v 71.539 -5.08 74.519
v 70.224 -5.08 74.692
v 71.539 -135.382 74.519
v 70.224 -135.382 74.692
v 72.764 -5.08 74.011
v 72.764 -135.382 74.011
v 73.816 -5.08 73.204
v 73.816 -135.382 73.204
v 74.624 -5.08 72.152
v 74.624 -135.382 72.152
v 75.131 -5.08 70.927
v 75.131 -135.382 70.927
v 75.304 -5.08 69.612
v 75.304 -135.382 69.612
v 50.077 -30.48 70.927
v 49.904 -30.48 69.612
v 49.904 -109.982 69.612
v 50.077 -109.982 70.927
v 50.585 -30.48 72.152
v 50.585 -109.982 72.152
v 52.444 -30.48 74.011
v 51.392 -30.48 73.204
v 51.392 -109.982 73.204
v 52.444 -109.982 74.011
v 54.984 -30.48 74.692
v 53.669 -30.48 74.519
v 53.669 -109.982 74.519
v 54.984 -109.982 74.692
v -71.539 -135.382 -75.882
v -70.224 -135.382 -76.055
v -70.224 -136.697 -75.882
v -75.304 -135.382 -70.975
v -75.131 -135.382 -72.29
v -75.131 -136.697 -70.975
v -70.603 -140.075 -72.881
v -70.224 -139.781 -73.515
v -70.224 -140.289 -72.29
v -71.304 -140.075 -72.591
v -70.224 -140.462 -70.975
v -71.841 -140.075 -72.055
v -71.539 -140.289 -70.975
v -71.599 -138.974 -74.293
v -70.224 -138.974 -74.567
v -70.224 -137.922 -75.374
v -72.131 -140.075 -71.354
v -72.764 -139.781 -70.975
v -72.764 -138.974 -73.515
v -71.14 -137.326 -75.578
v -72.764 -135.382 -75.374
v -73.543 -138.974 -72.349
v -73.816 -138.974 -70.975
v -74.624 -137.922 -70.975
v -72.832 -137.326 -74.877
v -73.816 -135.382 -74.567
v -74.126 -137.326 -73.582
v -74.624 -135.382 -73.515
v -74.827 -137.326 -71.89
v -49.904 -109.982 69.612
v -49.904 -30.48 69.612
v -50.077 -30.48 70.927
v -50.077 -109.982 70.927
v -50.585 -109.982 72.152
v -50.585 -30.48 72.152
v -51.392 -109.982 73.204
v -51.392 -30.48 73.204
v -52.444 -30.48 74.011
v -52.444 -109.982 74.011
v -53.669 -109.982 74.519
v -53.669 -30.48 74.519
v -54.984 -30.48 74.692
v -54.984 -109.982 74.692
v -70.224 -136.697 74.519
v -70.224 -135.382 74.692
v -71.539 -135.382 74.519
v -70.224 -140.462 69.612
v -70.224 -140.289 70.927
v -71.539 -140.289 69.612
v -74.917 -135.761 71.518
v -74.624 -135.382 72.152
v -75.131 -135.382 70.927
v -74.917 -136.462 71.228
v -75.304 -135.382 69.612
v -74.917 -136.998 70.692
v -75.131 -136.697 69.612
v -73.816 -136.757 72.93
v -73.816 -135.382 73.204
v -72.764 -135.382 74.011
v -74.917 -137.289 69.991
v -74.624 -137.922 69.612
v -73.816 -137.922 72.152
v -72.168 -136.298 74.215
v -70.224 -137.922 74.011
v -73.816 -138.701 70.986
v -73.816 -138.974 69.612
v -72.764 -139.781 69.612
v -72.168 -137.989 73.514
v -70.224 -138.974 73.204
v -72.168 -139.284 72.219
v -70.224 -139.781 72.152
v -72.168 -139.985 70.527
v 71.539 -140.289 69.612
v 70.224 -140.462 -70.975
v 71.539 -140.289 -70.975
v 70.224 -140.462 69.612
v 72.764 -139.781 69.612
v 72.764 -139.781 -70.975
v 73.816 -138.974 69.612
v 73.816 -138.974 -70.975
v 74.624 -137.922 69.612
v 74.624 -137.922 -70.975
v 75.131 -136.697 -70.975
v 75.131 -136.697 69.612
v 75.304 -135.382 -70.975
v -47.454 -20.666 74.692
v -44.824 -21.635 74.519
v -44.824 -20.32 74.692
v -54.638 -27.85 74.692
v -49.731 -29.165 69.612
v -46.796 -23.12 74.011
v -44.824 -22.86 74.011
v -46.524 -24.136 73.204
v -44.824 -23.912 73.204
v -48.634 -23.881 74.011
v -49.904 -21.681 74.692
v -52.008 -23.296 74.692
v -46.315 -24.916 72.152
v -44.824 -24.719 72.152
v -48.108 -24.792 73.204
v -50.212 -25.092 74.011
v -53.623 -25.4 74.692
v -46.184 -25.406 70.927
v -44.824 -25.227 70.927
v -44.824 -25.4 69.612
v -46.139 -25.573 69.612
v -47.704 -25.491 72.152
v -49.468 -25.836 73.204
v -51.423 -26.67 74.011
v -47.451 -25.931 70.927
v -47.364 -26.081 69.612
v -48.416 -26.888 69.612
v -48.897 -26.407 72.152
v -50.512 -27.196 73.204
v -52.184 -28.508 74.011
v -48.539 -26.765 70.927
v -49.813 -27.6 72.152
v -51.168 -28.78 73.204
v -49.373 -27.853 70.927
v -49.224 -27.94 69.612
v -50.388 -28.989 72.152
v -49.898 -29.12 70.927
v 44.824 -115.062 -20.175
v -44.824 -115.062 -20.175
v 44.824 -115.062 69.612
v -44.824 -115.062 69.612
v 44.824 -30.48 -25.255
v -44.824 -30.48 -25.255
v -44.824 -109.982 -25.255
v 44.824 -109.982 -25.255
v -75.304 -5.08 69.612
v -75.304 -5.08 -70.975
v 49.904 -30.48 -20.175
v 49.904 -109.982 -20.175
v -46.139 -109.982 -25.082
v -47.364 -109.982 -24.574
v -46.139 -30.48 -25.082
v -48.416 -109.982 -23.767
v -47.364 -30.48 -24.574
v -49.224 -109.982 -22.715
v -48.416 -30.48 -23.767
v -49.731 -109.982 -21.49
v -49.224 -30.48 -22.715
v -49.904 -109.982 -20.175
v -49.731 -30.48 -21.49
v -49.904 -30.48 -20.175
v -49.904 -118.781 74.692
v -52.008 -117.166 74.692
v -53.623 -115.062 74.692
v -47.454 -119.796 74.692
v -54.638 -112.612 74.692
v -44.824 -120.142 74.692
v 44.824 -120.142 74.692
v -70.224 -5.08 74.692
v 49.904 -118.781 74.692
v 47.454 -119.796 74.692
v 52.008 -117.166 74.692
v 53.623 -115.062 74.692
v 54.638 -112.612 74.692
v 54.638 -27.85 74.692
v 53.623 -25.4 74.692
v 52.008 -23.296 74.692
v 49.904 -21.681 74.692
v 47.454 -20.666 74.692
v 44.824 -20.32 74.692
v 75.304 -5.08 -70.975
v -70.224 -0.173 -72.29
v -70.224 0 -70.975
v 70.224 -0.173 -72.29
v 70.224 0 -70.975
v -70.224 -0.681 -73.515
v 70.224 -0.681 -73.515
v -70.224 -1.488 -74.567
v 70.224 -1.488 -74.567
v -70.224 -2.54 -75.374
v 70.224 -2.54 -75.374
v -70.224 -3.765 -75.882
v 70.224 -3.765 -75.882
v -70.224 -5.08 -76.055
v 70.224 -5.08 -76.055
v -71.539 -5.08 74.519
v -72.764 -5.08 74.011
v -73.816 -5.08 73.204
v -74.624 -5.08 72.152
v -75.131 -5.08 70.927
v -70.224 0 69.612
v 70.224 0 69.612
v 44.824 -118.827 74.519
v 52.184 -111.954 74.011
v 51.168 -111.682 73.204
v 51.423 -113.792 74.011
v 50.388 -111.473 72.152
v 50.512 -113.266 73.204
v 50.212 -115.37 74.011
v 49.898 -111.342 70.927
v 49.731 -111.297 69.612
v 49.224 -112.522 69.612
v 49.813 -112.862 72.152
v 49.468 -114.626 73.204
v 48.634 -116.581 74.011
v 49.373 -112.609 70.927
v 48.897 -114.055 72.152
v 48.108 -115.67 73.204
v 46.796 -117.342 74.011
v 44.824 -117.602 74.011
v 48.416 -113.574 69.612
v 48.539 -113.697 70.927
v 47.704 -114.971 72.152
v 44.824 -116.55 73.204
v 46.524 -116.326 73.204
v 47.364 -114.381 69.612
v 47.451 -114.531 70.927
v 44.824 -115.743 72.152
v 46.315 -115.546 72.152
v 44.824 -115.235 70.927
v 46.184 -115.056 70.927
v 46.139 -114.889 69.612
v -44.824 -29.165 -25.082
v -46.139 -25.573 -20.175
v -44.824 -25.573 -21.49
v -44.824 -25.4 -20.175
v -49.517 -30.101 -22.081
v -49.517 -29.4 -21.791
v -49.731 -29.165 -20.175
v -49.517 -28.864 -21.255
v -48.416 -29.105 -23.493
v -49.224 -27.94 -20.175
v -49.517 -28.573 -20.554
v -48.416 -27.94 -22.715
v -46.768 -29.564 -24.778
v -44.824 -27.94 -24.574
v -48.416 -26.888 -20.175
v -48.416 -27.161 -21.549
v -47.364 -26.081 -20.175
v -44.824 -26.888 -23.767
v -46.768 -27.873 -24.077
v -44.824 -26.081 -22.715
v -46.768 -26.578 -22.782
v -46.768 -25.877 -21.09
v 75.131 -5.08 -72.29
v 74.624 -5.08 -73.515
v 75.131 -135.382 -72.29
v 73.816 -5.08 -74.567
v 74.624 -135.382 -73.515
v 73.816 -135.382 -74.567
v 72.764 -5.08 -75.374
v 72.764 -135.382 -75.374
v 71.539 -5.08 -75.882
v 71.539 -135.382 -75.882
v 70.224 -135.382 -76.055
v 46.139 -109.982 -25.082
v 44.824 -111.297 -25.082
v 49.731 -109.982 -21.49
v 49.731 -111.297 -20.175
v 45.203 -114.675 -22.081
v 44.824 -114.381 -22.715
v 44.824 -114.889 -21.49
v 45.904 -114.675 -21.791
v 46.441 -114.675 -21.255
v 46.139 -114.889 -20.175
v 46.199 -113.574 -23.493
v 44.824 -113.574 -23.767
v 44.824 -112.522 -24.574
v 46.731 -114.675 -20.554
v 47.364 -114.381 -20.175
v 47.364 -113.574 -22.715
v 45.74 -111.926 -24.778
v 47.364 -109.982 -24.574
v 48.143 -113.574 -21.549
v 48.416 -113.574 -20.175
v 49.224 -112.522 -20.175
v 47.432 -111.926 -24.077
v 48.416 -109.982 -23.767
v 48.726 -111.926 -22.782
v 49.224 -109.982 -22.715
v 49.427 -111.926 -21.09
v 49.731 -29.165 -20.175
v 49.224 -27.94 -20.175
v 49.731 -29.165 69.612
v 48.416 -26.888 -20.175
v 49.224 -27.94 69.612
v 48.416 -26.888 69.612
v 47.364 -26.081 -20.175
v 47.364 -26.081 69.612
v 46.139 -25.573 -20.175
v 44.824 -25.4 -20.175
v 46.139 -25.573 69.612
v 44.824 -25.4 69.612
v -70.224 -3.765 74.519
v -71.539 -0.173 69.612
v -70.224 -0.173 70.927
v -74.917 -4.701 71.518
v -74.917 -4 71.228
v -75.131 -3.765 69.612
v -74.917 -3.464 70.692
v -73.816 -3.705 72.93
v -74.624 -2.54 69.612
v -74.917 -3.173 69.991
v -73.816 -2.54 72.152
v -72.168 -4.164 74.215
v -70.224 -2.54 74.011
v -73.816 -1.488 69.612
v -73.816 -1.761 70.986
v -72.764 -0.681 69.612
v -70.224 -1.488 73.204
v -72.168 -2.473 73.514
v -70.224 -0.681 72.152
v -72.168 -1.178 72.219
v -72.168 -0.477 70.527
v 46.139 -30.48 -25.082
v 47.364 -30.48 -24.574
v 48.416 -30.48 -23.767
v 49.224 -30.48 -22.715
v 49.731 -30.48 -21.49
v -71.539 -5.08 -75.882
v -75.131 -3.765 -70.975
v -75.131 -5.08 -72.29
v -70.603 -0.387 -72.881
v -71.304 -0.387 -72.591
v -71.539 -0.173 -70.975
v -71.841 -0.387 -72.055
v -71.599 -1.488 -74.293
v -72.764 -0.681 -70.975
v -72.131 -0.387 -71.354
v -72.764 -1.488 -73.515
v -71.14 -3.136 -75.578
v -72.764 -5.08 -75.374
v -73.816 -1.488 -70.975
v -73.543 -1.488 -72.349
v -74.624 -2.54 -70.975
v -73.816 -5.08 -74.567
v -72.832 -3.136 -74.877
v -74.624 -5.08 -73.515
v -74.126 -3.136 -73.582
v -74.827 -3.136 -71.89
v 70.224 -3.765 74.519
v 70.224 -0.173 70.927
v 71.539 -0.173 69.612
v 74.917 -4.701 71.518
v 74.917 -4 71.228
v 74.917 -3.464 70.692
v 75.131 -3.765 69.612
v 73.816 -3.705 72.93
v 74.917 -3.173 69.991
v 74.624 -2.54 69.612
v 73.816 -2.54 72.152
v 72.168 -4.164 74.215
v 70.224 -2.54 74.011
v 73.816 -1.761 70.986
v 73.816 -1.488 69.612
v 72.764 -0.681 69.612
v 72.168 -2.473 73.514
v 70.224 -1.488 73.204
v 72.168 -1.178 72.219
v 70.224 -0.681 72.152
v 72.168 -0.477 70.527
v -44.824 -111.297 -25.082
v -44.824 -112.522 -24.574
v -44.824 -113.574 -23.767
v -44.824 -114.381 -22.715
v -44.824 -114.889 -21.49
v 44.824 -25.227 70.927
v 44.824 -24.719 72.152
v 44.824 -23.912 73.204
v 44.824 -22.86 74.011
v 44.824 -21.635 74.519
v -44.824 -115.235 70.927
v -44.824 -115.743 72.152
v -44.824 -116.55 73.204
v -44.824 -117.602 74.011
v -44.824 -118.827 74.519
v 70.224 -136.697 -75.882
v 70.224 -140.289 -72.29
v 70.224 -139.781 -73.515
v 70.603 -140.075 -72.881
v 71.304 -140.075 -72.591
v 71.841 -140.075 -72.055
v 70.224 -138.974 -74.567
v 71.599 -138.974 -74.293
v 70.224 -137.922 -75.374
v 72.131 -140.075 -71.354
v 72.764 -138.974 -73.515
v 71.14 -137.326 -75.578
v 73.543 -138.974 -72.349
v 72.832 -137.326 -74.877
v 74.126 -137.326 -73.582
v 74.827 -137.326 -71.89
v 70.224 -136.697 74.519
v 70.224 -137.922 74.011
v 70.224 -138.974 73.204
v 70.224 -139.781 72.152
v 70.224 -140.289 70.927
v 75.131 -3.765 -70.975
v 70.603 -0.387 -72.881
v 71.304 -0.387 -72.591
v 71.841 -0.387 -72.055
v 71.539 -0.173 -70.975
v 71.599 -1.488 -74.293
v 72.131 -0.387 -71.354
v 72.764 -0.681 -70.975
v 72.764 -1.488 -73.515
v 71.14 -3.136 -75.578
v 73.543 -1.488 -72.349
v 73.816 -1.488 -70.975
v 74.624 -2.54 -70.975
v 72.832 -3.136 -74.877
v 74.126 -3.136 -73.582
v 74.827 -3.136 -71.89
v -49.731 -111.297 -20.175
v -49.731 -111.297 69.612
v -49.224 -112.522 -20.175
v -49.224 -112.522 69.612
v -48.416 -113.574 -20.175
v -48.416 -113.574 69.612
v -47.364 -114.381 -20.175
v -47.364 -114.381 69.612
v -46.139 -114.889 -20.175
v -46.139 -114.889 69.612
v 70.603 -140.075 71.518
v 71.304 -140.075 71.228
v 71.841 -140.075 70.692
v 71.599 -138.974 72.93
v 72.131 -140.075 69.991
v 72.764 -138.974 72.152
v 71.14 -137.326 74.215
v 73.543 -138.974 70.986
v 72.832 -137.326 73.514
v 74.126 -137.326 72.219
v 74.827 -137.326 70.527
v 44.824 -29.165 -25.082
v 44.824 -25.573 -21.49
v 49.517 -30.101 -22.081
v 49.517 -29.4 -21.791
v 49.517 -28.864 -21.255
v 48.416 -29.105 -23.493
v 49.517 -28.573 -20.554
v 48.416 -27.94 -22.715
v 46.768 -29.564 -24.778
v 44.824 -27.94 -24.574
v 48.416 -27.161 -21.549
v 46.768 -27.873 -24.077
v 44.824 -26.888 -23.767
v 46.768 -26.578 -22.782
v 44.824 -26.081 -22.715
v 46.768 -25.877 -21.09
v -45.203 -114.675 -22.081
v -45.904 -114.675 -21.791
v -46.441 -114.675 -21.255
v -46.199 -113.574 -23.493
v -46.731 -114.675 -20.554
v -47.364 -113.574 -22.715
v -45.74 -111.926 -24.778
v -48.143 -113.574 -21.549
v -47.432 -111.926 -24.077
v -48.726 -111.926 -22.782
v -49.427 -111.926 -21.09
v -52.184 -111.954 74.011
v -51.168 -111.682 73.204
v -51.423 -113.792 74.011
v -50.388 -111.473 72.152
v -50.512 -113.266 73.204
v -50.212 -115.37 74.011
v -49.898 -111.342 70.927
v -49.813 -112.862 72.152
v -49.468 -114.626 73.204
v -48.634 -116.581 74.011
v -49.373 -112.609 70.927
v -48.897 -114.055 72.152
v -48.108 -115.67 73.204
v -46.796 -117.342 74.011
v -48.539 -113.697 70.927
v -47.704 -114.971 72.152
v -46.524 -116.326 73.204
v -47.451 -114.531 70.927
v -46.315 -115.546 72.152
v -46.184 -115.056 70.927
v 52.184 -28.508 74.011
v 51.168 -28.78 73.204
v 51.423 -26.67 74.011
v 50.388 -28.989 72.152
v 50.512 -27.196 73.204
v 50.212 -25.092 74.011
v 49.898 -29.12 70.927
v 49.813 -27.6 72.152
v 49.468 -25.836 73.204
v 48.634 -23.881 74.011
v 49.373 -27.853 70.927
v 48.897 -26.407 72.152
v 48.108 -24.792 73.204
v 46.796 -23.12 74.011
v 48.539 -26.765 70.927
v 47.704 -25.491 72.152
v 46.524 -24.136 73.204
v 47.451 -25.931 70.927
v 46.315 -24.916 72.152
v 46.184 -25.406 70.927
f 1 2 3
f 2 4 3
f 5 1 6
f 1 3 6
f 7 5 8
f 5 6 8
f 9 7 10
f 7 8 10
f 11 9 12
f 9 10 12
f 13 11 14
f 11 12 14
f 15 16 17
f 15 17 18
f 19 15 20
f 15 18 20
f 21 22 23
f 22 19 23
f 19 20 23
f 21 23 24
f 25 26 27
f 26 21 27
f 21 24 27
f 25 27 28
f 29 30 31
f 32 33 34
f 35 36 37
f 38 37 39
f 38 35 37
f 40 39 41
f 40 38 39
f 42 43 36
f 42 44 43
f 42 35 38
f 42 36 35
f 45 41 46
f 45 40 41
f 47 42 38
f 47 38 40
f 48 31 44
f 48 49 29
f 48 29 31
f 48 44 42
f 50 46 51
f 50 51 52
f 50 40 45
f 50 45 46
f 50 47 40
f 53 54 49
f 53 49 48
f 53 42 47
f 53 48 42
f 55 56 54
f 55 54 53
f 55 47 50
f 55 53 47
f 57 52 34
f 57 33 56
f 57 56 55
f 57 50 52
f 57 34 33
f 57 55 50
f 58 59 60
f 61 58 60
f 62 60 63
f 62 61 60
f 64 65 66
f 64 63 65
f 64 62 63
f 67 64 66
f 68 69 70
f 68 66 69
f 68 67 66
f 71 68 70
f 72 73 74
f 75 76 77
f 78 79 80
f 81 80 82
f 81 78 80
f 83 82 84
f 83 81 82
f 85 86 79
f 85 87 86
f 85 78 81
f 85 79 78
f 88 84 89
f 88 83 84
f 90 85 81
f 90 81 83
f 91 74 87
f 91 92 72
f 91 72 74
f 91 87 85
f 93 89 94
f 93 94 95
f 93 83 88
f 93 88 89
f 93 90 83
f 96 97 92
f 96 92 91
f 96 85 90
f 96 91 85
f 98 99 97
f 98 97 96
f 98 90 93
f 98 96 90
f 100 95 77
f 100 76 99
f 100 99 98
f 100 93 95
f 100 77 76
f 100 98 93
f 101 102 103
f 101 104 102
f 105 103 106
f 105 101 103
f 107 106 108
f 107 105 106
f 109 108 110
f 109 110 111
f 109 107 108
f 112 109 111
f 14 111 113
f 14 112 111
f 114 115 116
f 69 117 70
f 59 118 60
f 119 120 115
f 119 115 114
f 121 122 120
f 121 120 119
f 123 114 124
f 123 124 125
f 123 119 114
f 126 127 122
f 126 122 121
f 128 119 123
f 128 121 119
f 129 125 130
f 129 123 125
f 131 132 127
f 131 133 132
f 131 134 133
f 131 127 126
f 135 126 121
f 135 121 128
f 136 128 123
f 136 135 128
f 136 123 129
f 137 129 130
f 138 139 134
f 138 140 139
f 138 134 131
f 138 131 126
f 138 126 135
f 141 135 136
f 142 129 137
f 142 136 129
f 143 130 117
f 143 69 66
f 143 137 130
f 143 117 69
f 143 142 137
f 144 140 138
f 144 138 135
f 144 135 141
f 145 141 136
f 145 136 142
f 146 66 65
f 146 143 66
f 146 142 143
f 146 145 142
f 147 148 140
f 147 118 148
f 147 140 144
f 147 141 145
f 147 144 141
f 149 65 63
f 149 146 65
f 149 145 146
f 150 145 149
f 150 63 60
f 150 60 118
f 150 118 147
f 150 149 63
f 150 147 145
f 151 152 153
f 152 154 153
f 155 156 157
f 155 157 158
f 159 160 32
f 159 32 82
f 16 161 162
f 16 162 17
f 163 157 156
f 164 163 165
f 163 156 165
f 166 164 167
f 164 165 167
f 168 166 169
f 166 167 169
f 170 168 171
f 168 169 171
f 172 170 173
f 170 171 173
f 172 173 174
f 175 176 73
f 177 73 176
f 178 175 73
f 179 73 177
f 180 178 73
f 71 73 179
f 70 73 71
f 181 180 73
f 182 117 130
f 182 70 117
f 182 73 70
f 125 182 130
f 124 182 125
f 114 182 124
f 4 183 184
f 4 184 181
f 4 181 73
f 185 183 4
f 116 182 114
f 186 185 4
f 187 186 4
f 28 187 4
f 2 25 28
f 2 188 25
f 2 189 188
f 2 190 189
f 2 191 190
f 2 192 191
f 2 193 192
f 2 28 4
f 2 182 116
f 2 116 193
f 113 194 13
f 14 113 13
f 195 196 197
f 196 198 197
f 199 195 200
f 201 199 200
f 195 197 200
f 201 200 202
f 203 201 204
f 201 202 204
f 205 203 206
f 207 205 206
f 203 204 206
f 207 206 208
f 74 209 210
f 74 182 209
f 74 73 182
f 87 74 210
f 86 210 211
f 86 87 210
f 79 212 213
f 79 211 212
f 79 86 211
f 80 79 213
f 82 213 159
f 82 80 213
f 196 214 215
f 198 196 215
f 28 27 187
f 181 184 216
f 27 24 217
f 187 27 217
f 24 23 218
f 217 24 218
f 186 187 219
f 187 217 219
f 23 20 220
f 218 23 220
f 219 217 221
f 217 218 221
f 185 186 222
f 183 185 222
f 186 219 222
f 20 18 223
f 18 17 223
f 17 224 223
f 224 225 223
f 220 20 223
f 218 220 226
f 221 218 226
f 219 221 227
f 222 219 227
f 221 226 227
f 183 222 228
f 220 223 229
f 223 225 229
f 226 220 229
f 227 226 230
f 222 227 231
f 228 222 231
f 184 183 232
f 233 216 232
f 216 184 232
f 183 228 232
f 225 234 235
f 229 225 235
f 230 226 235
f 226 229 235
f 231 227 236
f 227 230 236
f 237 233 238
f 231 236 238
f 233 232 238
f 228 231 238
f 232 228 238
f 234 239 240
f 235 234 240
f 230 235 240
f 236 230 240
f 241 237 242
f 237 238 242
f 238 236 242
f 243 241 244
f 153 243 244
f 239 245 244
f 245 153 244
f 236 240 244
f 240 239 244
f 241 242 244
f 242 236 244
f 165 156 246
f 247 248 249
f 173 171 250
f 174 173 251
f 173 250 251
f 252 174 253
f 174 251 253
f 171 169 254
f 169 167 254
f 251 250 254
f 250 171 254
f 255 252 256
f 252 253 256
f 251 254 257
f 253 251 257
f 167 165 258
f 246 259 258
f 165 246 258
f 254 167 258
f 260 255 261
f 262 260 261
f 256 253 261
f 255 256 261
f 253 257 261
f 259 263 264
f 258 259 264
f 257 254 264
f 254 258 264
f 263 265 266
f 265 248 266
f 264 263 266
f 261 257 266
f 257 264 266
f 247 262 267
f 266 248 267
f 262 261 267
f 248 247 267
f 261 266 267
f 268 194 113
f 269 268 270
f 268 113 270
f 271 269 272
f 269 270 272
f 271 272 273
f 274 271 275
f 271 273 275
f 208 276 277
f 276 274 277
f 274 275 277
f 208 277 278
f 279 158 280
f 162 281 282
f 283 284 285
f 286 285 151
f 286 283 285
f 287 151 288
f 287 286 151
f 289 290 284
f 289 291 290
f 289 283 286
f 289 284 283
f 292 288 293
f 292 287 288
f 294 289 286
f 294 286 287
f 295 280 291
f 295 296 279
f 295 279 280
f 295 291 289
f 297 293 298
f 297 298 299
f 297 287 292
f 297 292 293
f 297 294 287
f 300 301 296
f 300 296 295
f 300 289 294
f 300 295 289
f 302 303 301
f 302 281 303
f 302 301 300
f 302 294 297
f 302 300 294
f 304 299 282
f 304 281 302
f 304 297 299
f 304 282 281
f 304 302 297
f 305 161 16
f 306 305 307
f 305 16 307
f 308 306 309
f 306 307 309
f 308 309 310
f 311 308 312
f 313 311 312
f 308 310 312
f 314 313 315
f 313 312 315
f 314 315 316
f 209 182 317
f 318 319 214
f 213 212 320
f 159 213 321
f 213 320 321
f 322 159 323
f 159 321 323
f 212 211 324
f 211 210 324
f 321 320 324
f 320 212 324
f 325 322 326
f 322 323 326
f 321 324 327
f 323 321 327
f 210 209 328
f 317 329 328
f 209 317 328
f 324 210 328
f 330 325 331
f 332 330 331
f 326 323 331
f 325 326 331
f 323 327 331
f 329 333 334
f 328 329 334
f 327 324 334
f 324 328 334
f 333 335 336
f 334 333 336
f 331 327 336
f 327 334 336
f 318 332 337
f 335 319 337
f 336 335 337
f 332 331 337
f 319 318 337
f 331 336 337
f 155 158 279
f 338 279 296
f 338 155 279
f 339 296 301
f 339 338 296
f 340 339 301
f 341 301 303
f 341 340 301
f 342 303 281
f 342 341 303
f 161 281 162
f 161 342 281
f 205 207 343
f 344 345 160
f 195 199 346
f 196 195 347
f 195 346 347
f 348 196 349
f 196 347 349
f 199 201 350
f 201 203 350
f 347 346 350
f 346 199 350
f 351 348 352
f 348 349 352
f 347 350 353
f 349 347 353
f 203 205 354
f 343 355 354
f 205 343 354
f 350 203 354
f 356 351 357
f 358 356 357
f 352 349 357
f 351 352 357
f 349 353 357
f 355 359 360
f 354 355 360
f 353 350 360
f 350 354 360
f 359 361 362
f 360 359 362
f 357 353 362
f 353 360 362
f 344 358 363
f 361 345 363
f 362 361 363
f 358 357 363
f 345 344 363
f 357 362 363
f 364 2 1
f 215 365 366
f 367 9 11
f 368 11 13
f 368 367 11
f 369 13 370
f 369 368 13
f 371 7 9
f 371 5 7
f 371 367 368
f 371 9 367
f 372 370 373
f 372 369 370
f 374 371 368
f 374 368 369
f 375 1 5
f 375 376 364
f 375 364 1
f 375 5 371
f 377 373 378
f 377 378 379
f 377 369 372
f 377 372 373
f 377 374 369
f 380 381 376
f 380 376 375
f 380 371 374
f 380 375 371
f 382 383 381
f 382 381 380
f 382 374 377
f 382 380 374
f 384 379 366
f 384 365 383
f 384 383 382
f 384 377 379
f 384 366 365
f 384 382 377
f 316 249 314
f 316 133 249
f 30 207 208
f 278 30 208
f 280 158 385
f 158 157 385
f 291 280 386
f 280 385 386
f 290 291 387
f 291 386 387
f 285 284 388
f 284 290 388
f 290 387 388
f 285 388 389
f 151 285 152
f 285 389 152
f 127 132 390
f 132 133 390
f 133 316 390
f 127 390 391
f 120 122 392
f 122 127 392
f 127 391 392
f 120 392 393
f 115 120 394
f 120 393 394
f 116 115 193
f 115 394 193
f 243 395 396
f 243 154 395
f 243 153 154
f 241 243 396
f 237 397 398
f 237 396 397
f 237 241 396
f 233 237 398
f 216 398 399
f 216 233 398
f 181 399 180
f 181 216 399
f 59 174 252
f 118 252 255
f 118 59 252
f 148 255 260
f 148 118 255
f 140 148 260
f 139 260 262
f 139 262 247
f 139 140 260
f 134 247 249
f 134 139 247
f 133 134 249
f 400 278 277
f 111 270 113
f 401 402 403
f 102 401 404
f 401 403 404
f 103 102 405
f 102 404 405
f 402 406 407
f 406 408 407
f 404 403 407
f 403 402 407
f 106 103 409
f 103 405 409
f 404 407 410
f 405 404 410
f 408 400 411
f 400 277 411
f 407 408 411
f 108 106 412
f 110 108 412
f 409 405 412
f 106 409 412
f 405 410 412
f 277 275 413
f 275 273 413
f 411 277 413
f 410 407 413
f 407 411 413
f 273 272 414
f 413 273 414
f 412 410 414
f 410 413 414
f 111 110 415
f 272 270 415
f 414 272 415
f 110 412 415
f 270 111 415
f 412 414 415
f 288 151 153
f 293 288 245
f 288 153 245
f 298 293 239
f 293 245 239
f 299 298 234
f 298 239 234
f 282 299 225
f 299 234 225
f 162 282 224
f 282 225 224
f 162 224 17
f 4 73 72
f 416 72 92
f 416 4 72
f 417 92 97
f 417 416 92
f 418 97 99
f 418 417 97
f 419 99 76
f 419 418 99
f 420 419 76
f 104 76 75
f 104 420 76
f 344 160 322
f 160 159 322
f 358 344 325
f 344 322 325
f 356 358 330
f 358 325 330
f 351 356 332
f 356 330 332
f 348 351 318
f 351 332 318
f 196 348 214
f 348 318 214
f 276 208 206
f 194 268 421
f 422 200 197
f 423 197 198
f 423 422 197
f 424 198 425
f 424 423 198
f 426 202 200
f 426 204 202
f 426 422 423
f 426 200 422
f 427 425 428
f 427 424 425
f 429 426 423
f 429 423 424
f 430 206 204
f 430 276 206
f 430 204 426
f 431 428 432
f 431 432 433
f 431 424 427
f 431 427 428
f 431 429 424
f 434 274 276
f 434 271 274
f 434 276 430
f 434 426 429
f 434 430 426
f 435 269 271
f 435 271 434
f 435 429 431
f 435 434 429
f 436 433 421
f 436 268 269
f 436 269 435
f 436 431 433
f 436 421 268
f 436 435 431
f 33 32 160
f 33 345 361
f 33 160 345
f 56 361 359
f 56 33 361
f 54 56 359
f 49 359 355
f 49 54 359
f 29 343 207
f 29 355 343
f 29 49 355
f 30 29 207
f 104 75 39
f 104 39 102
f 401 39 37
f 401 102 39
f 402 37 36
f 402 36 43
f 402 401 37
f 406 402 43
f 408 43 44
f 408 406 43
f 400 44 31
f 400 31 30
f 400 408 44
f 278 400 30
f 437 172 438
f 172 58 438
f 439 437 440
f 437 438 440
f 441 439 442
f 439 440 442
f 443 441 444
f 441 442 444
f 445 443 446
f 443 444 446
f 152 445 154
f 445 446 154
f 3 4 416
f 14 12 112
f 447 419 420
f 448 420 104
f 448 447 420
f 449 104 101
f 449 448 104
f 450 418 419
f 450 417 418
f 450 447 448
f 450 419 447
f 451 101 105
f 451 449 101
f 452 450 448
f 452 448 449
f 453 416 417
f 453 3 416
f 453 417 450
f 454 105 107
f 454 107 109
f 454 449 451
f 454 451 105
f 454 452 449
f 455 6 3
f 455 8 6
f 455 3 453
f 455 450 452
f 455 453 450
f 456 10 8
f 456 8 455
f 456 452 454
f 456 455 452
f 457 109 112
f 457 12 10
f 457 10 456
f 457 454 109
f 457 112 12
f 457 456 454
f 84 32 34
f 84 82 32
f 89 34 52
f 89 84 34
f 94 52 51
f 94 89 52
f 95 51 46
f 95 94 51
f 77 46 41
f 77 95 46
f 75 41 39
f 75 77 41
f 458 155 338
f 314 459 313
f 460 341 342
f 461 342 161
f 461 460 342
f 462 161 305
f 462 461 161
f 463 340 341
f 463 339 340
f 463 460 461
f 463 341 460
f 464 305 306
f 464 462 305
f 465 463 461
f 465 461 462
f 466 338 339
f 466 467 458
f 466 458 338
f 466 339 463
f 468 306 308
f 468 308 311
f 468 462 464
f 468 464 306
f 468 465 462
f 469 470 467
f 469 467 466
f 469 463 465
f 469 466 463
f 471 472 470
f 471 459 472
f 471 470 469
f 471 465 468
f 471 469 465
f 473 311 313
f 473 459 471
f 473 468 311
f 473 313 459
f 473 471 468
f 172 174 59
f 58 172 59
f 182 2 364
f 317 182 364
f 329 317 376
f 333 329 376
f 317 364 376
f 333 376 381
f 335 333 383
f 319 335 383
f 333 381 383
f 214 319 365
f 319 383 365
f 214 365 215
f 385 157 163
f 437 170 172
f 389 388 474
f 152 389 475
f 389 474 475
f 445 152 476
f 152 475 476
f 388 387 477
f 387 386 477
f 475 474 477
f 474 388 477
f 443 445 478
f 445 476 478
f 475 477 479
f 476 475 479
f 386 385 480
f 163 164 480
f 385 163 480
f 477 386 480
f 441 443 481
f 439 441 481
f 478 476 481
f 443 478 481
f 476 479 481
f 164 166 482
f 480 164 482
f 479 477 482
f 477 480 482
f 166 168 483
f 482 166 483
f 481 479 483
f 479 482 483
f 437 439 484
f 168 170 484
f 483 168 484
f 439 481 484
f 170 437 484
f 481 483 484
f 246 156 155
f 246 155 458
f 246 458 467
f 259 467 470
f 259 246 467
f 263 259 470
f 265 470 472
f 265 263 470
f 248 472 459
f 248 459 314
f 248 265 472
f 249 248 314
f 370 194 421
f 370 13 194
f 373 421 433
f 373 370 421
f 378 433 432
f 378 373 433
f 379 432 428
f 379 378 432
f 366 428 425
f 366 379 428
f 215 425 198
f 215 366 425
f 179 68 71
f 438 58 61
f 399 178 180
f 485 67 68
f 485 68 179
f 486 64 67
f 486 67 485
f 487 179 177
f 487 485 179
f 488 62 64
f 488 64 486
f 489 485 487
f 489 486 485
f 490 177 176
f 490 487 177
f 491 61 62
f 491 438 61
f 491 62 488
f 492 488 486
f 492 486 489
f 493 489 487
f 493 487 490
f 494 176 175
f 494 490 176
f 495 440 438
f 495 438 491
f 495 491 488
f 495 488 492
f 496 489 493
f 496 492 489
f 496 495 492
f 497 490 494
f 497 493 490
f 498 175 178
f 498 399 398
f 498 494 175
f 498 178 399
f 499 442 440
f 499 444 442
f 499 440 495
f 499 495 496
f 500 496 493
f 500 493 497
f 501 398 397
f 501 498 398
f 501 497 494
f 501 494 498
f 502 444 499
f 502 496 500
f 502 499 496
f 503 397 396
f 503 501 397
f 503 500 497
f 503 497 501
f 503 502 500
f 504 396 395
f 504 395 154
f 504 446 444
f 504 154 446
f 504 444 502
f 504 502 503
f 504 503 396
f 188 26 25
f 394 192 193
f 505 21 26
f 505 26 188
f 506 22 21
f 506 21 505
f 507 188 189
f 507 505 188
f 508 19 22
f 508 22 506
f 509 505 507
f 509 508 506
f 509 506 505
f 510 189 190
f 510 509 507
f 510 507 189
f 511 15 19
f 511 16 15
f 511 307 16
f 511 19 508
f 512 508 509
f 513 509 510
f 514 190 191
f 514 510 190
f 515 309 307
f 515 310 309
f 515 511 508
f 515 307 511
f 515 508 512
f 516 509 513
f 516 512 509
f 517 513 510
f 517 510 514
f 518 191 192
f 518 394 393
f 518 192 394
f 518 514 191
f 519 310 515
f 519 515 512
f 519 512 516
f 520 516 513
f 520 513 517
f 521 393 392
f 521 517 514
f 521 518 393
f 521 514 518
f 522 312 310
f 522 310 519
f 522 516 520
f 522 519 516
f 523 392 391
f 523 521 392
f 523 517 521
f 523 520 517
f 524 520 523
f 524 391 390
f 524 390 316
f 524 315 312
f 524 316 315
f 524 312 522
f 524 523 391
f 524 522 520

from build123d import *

# Parameters (mm, degrees)
F0_W     = 150.6082415581
F0_H     = 150.7464423776
F1_DEPTH = 140.462
F2_T     = -25.4
F3_DEPTH = 25.4
F5_R     = 5.08


with BuildPart() as f1:
    # F0 (on Front) → F1 (new body)
    with BuildSketch(Plane.XZ):
        with Locations((0, -0.6814859807)):
            Rectangle(F0_W, F0_H)
    extrude(amount=F1_DEPTH)

    # F2
    f2_openings = [f1.faces().sort_by_distance(p)[0] for p in [
        (0, -70.231, 74.691735),
    ]]
    offset(amount=F2_T, openings=f2_openings)

    # F3 (add): a face of the model
    f3_faces = [f1.faces().sort_by_distance(p)[0] for p in [
        (0, -70.231, -50.6547071695),
    ]]
    extrude(f3_faces, amount=F3_DEPTH)

    # F5
    f5_edges = [f1.edges().sort_by_distance(p)[0] for p in [
        (0, -25.4, -25.254707),
        (49.904121, -70.231, -25.254707),
        (-49.904121, -70.231, -25.254707),
        (0, -115.062, -25.254707),
        (0, 0, 74.691735),
        (75.304121, -70.231, 74.691735),
        (0, -140.462, 74.691735),
        (-75.304121, -70.231, 74.691735),
        (49.904121, -70.231, 74.691735),
        (0, -25.4, 74.691735),
        (-49.904121, -70.231, 74.691735),
        (0, -115.062, 74.691735),
        (-75.304121, -70.231, -76.054707),
        (75.304121, -70.231, -76.054707),
        (0, 0, -76.054707),
        (0, -140.462, -76.054707),
        (-75.304121, -140.462, -0.681486),
        (75.304121, -140.462, -0.681486),
        (75.304121, 0, -0.681486),
        (-75.304121, 0, -0.681486),
        (-49.904121, -25.4, 24.718514),
        (-49.904121, -115.062, 24.718514),
        (49.904121, -115.062, 24.718514),
        (49.904121, -25.4, 24.718514),
    ]]
    fillet(f5_edges, radius=F5_R)


solid = f1.part
